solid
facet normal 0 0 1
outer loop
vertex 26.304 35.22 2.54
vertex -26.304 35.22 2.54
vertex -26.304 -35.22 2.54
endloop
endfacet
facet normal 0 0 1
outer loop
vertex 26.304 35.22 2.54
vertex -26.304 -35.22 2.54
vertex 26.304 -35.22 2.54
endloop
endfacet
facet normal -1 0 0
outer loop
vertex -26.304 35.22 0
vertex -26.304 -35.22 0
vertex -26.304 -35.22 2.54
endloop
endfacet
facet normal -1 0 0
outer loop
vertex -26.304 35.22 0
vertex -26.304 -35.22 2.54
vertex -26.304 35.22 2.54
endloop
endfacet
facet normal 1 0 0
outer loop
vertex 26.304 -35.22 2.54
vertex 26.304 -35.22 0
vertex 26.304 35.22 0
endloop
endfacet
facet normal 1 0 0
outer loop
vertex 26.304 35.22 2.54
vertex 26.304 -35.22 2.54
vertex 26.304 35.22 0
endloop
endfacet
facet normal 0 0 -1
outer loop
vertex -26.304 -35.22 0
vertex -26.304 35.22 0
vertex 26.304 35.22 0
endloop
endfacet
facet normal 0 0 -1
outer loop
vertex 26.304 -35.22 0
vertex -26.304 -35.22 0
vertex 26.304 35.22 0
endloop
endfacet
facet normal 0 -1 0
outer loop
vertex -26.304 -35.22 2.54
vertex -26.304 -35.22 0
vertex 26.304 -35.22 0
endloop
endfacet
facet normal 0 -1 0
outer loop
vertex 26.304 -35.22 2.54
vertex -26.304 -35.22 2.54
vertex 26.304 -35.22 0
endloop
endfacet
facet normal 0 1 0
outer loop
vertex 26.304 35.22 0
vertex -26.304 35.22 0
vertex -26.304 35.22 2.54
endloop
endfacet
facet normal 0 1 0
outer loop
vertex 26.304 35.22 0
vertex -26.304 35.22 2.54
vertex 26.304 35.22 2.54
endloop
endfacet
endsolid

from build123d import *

# Parameters (mm, degrees)
F0_R          = 11.93546
F1_DEPTH      = 14.478
F3_W          = 95.2036306262
F3_H          = 59.2658370733
F4_DEPTH      = 25.4
F4_DEPTH_BACK = 25.4
F6_W          = 52.6070035994
F6_H          = 70.439890027
F7_DEPTH      = 2.54


with BuildPart() as f1:
    # F0 (on Front) → F1 (new body)
    with BuildSketch(Plane.XZ):
        Circle(F0_R)
    extrude(amount=F1_DEPTH)


with BuildPart() as f4:
    # F3 (on Front) → F4 (new body, two sides)
    with BuildSketch(Plane.XZ) as f4_sk:
        Rectangle(F3_W, F3_H)
    extrude(amount=F4_DEPTH)
    extrude(f4_sk.sketch, amount=-F4_DEPTH_BACK)


with BuildPart() as f7:
    # F6 (on Top) → F7 (new body)
    with BuildSketch(Plane.XY):
        Rectangle(F6_W, F6_H)
    extrude(amount=F7_DEPTH)


solid = f7.part
